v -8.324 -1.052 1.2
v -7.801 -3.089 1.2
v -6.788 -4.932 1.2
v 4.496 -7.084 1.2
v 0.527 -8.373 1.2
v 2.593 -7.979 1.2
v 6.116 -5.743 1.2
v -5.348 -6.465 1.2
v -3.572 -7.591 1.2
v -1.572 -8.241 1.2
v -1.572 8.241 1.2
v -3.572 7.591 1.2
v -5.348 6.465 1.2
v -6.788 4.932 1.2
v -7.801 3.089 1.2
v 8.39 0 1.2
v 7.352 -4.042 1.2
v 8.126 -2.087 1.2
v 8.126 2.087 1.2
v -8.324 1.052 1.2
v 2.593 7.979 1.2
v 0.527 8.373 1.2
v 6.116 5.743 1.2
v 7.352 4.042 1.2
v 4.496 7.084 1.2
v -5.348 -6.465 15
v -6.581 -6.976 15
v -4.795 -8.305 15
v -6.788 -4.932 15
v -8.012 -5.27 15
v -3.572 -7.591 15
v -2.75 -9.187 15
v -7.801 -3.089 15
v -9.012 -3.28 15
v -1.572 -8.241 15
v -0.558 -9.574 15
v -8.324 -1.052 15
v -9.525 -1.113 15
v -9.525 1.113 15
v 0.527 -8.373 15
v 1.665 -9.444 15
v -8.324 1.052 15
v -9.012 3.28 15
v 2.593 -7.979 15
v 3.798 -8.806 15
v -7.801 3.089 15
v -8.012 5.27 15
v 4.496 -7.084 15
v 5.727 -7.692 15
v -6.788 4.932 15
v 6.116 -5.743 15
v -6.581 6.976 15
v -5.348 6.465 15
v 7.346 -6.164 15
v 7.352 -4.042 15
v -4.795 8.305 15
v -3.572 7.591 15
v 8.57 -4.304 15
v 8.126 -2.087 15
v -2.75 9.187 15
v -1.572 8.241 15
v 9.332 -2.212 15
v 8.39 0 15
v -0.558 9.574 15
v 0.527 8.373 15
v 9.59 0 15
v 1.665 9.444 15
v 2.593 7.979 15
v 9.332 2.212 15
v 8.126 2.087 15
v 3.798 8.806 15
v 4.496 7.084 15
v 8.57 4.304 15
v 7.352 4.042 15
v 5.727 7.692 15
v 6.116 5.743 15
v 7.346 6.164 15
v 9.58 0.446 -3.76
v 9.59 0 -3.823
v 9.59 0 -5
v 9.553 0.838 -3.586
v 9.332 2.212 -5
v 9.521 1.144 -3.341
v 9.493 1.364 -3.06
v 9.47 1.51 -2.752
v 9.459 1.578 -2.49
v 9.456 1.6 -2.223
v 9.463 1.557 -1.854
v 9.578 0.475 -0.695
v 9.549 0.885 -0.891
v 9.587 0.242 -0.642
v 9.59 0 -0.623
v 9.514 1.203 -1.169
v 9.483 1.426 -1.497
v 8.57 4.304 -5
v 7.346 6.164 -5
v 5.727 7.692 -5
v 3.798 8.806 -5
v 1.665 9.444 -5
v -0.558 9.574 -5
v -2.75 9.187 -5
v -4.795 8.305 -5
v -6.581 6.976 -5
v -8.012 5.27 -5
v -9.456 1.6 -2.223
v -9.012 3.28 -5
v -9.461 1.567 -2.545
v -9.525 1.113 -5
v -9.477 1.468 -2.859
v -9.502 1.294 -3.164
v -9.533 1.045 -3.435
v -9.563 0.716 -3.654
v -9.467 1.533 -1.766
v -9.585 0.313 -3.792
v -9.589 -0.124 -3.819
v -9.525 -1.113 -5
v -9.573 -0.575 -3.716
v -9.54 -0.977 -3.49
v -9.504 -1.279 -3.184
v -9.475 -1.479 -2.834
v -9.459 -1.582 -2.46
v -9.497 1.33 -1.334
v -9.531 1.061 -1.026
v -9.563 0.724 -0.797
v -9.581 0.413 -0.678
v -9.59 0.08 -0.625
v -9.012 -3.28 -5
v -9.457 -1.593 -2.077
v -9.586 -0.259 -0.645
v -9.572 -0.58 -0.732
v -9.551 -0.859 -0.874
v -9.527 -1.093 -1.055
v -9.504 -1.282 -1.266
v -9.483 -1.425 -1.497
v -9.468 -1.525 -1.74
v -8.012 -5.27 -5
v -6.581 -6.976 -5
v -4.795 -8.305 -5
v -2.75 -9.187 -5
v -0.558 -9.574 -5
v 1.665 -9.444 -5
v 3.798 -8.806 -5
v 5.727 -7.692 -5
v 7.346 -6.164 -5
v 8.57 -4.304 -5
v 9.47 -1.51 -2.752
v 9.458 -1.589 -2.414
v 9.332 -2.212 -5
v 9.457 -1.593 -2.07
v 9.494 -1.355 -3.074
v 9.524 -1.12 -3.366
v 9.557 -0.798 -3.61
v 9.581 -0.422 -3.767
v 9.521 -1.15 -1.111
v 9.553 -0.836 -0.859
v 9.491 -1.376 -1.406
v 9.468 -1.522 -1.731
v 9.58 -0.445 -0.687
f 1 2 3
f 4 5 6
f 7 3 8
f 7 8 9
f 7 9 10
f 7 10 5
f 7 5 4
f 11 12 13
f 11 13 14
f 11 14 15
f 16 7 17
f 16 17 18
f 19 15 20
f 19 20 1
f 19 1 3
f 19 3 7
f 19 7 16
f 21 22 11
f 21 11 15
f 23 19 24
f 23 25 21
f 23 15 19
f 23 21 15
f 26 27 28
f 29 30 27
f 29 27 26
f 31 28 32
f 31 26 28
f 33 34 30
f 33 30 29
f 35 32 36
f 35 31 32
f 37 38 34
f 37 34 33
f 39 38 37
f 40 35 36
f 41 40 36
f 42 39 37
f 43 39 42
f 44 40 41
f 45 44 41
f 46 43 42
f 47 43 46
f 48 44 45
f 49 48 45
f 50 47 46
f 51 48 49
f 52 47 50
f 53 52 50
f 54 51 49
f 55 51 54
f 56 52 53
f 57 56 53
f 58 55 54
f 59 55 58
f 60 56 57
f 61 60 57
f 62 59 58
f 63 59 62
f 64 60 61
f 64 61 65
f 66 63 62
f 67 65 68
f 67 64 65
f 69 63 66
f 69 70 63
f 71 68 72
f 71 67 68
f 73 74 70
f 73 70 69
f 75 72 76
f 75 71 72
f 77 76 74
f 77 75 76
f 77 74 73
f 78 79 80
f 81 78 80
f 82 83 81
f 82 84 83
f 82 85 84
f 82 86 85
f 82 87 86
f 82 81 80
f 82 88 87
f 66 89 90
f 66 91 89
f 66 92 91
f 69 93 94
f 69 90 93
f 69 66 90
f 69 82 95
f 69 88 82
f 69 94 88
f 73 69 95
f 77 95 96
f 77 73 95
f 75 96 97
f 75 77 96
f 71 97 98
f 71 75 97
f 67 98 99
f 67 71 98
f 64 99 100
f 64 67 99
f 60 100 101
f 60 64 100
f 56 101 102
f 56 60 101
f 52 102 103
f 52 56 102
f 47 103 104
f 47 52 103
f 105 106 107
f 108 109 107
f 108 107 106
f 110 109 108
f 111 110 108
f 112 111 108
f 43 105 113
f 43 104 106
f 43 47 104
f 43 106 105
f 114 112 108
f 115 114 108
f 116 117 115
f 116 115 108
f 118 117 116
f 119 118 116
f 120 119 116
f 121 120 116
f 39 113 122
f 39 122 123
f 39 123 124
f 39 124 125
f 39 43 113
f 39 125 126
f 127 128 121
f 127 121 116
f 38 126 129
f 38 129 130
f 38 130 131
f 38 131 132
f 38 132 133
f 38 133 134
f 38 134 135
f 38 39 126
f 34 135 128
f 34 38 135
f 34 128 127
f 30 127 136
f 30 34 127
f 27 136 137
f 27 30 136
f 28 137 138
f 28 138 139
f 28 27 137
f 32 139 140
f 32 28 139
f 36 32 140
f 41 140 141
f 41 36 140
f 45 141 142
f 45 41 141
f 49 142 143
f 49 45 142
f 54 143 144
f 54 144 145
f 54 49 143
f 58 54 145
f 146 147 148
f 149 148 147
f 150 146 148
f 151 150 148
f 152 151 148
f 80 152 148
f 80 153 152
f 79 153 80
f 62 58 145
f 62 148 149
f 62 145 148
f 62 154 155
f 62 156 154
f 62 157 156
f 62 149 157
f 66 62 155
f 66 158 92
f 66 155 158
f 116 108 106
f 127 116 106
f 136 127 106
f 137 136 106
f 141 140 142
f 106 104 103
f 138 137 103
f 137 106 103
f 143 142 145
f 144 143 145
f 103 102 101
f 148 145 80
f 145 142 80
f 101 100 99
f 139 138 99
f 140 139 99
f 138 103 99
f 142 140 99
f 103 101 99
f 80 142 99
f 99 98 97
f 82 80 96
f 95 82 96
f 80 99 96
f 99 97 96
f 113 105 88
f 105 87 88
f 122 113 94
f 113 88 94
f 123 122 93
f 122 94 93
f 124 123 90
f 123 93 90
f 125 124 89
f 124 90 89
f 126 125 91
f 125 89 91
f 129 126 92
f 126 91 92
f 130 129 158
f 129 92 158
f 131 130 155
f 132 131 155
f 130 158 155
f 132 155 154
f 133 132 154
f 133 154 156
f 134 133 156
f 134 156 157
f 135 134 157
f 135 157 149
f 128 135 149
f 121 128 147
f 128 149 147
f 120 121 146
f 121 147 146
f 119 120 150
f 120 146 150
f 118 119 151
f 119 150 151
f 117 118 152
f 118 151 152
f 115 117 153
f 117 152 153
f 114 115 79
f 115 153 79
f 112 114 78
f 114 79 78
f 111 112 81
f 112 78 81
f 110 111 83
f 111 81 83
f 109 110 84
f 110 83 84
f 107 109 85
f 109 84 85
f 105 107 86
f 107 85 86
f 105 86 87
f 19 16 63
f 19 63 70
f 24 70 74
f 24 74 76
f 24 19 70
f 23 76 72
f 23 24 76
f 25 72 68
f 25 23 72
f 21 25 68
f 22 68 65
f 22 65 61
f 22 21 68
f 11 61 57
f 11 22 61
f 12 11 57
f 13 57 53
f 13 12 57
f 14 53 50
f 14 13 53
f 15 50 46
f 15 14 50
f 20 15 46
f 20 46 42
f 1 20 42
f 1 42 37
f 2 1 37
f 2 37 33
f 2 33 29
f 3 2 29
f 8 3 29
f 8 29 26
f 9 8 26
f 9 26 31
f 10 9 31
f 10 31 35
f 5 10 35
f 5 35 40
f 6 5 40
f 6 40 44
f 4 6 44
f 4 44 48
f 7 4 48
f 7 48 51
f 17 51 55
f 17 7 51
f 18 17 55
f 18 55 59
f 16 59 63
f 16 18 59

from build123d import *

# Parameters (mm, degrees)
F0_R     = 9.59
F0_R_2   = 8.39
F1_DEPTH = 15
F2_DEPTH = 1.2
F3_W     = 2
F3_H     = 6
F4_DEPTH = 5
F5_R     = 1.6
F6_DEPTH = 15.2727807522
F7_DEPTH = 5
F8_DEPTH = 5
F9_DEPTH = 39.7


with BuildPart() as f1:
    # F0 (on Top) → F1 (new body)
    with BuildSketch(Plane.XY):
        Circle(F0_R)
        Circle(F0_R_2, mode=Mode.SUBTRACT)
    extrude(amount=F1_DEPTH)

    # F0 (on Top) → F2 (join)
    with BuildSketch(Plane.XY):
        Circle(F0_R_2)
    extrude(amount=F2_DEPTH)

    # F3 (on face) → F4 (join)
    with BuildSketch(Plane.XY):
        with Locations((-4.6817807522, 0)):
            Rectangle(F3_W, F3_H)
        with Locations((4.6817807522, 0)):
            Rectangle(F3_W, F3_H)
    extrude(amount=-F4_DEPTH)

    # F5 (on face) → F6 (cut, through all)
    with BuildSketch(Plane.YZ.offset(5.6817807522)):
        with Locations((0, -2.223377116)):
            Circle(F5_R)
    extrude(amount=-F6_DEPTH, mode=Mode.SUBTRACT)

    # F0 (on Top) → F7 (join)
    with BuildSketch(Plane.XY):
        Circle(F0_R_2)
    extrude(amount=-F7_DEPTH)

    # F0 (on Top) → F8 (join)
    with BuildSketch(Plane.XY):
        Circle(F0_R)
        Circle(F0_R_2, mode=Mode.SUBTRACT)
    extrude(amount=-F8_DEPTH)

    # F5 (on face) → F9 (cut, symmetric)
    with BuildSketch(Plane.YZ.offset(5.6817807522)):
        with Locations((0, -2.223377116)):
            Circle(F5_R)
    extrude(amount=F9_DEPTH, both=True, mode=Mode.SUBTRACT)


solid = f1.part
